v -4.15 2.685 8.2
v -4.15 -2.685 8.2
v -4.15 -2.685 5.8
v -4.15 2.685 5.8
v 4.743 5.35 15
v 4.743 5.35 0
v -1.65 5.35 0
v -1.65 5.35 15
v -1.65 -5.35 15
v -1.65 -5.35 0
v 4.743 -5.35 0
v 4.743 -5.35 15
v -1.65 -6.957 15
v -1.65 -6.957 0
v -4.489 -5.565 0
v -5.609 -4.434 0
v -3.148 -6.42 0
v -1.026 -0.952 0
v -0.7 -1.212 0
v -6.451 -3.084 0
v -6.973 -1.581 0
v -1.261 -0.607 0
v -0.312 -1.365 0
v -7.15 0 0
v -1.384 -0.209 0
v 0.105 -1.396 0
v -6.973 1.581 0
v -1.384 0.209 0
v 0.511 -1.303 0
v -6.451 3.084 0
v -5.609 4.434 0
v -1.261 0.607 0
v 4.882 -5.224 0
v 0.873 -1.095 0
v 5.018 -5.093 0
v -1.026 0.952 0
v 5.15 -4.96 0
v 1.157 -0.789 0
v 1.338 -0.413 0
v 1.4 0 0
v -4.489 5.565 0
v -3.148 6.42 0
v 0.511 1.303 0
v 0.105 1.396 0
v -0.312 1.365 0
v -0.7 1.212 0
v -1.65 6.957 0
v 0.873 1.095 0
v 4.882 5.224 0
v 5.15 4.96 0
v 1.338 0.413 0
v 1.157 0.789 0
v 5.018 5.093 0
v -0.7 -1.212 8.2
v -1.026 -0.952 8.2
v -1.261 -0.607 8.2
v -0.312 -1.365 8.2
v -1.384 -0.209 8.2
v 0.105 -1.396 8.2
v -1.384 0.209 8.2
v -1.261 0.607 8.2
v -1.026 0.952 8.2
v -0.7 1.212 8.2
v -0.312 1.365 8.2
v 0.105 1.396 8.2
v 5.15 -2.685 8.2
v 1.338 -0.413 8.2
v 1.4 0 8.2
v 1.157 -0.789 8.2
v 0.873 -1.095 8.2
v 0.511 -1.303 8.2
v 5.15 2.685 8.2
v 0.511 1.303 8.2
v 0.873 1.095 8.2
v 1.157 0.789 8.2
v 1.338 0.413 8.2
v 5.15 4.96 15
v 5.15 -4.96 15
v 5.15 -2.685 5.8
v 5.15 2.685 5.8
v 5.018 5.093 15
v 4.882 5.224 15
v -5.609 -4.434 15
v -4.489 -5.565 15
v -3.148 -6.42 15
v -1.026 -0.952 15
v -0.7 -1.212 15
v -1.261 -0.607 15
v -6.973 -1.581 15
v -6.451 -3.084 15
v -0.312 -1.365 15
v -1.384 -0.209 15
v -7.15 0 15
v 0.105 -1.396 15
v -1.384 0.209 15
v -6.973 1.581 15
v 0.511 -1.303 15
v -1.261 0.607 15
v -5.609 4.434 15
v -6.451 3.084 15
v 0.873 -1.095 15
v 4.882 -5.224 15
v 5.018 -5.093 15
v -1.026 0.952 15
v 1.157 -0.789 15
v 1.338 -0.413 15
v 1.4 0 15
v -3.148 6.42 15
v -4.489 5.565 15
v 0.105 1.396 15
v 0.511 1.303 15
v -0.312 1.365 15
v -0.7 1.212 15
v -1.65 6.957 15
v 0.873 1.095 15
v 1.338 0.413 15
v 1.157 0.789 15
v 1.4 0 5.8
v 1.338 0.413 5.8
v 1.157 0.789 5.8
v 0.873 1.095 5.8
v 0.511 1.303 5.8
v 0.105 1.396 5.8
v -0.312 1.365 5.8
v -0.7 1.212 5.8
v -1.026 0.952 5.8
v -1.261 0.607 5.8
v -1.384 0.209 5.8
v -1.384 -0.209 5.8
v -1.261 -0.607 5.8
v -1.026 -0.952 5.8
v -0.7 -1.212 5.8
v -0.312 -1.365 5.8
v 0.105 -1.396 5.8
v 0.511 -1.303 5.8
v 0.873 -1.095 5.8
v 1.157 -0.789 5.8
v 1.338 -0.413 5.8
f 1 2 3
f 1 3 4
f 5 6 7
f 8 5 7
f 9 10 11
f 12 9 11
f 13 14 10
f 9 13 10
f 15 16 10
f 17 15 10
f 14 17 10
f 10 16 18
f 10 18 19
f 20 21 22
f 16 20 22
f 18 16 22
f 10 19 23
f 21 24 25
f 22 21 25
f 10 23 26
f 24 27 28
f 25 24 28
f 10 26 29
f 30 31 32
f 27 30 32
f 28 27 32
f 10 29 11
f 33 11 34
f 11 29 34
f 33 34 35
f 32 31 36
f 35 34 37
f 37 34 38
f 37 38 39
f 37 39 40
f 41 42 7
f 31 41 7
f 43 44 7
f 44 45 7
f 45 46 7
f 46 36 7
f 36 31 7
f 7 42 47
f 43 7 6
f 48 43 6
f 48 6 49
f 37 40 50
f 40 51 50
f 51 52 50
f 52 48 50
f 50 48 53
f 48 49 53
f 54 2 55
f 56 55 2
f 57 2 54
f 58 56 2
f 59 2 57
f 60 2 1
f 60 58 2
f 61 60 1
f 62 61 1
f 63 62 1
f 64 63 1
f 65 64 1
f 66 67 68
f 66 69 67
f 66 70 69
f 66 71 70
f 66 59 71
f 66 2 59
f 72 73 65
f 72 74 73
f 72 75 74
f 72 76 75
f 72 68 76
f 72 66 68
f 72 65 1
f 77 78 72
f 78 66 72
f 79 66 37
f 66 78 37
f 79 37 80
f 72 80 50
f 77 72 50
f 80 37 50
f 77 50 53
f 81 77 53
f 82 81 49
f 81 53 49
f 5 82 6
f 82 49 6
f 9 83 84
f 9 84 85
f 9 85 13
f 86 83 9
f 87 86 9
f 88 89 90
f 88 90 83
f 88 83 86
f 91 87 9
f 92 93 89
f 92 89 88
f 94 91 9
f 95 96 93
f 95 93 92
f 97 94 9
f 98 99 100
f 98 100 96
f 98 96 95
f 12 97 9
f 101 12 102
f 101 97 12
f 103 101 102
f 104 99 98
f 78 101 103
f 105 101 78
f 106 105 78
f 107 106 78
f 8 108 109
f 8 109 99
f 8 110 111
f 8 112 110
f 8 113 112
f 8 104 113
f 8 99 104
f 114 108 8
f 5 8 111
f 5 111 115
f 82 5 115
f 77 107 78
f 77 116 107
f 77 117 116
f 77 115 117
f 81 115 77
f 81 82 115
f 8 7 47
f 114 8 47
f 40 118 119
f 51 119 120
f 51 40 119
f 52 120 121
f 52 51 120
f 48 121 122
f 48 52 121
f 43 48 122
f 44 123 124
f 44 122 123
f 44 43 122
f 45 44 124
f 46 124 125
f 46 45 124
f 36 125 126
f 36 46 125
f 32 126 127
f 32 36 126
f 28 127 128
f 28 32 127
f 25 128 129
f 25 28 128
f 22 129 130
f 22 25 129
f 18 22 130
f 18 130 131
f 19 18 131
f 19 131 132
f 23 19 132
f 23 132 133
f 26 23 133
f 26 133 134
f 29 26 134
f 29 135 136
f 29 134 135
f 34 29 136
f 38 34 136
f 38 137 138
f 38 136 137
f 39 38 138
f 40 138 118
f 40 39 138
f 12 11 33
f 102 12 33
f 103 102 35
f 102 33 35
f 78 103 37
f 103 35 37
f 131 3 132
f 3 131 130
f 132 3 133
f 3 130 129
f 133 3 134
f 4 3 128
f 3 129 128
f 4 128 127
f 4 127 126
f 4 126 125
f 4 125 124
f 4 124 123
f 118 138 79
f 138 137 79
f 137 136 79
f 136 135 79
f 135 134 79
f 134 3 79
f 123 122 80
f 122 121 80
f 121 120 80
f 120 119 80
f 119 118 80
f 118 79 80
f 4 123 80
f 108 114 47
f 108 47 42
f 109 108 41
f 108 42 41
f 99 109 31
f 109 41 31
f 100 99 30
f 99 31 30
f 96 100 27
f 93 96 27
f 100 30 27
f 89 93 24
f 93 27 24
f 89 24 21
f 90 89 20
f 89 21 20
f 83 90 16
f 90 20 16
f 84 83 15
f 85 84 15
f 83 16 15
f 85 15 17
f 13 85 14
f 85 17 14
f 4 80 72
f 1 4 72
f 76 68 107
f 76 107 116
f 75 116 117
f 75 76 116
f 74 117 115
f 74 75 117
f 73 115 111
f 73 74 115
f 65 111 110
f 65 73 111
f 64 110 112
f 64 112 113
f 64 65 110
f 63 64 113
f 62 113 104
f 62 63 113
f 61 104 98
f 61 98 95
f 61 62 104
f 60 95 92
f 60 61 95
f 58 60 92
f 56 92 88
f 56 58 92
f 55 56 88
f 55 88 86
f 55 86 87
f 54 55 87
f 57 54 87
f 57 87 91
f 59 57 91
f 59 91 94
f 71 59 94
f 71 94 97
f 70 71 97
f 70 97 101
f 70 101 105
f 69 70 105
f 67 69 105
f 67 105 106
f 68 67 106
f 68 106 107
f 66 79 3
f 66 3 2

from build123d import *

# Parameters (mm, degrees)
F0_R     = 1.4
F1_DEPTH = 15
F2_W     = 5.37
F2_H     = 2.4
F3_DEPTH = 9.3


with BuildPart() as f1:
    # F0 (on Top) → F1 (new body)
    with BuildSketch(Plane.XY):
        with BuildLine():
            Line((-1.65, 5.35), (-1.65, 6.9570108524))
            ThreePointArc((-1.65, 6.9570108524), (-7.15, 0), (-1.65, -6.9570108524))
            Line((-1.65, -6.9570108524), (-1.65, -5.35))
            Line((-1.65, -5.35), (-1.65, 5.35))
        make_face()
        with BuildLine():
            Line((5.15, -4.9598387071), (5.15, 4.9598387071))
            ThreePointArc((5.15, 4.9598387071), (4.9505533954, 5.1589263494), (4.7434164903, 5.35))
            Line((4.7434164903, 5.35), (-1.65, 5.35))
            Line((-1.65, 5.35), (-1.65, -5.35))
            Line((-1.65, -5.35), (4.7434164903, -5.35))
            ThreePointArc((4.7434164903, -5.35), (4.9505533954, -5.1589263494), (5.15, -4.9598387071))
        make_face()
        Circle(F0_R, mode=Mode.SUBTRACT)
    extrude(amount=F1_DEPTH)

    # F2 (on face) → F3 (cut)
    with BuildSketch(Plane.YZ.offset(5.15)):
        with Locations((0, 7)):
            Rectangle(F2_W, F2_H)
    extrude(amount=-F3_DEPTH, mode=Mode.SUBTRACT)


solid = f1.part
